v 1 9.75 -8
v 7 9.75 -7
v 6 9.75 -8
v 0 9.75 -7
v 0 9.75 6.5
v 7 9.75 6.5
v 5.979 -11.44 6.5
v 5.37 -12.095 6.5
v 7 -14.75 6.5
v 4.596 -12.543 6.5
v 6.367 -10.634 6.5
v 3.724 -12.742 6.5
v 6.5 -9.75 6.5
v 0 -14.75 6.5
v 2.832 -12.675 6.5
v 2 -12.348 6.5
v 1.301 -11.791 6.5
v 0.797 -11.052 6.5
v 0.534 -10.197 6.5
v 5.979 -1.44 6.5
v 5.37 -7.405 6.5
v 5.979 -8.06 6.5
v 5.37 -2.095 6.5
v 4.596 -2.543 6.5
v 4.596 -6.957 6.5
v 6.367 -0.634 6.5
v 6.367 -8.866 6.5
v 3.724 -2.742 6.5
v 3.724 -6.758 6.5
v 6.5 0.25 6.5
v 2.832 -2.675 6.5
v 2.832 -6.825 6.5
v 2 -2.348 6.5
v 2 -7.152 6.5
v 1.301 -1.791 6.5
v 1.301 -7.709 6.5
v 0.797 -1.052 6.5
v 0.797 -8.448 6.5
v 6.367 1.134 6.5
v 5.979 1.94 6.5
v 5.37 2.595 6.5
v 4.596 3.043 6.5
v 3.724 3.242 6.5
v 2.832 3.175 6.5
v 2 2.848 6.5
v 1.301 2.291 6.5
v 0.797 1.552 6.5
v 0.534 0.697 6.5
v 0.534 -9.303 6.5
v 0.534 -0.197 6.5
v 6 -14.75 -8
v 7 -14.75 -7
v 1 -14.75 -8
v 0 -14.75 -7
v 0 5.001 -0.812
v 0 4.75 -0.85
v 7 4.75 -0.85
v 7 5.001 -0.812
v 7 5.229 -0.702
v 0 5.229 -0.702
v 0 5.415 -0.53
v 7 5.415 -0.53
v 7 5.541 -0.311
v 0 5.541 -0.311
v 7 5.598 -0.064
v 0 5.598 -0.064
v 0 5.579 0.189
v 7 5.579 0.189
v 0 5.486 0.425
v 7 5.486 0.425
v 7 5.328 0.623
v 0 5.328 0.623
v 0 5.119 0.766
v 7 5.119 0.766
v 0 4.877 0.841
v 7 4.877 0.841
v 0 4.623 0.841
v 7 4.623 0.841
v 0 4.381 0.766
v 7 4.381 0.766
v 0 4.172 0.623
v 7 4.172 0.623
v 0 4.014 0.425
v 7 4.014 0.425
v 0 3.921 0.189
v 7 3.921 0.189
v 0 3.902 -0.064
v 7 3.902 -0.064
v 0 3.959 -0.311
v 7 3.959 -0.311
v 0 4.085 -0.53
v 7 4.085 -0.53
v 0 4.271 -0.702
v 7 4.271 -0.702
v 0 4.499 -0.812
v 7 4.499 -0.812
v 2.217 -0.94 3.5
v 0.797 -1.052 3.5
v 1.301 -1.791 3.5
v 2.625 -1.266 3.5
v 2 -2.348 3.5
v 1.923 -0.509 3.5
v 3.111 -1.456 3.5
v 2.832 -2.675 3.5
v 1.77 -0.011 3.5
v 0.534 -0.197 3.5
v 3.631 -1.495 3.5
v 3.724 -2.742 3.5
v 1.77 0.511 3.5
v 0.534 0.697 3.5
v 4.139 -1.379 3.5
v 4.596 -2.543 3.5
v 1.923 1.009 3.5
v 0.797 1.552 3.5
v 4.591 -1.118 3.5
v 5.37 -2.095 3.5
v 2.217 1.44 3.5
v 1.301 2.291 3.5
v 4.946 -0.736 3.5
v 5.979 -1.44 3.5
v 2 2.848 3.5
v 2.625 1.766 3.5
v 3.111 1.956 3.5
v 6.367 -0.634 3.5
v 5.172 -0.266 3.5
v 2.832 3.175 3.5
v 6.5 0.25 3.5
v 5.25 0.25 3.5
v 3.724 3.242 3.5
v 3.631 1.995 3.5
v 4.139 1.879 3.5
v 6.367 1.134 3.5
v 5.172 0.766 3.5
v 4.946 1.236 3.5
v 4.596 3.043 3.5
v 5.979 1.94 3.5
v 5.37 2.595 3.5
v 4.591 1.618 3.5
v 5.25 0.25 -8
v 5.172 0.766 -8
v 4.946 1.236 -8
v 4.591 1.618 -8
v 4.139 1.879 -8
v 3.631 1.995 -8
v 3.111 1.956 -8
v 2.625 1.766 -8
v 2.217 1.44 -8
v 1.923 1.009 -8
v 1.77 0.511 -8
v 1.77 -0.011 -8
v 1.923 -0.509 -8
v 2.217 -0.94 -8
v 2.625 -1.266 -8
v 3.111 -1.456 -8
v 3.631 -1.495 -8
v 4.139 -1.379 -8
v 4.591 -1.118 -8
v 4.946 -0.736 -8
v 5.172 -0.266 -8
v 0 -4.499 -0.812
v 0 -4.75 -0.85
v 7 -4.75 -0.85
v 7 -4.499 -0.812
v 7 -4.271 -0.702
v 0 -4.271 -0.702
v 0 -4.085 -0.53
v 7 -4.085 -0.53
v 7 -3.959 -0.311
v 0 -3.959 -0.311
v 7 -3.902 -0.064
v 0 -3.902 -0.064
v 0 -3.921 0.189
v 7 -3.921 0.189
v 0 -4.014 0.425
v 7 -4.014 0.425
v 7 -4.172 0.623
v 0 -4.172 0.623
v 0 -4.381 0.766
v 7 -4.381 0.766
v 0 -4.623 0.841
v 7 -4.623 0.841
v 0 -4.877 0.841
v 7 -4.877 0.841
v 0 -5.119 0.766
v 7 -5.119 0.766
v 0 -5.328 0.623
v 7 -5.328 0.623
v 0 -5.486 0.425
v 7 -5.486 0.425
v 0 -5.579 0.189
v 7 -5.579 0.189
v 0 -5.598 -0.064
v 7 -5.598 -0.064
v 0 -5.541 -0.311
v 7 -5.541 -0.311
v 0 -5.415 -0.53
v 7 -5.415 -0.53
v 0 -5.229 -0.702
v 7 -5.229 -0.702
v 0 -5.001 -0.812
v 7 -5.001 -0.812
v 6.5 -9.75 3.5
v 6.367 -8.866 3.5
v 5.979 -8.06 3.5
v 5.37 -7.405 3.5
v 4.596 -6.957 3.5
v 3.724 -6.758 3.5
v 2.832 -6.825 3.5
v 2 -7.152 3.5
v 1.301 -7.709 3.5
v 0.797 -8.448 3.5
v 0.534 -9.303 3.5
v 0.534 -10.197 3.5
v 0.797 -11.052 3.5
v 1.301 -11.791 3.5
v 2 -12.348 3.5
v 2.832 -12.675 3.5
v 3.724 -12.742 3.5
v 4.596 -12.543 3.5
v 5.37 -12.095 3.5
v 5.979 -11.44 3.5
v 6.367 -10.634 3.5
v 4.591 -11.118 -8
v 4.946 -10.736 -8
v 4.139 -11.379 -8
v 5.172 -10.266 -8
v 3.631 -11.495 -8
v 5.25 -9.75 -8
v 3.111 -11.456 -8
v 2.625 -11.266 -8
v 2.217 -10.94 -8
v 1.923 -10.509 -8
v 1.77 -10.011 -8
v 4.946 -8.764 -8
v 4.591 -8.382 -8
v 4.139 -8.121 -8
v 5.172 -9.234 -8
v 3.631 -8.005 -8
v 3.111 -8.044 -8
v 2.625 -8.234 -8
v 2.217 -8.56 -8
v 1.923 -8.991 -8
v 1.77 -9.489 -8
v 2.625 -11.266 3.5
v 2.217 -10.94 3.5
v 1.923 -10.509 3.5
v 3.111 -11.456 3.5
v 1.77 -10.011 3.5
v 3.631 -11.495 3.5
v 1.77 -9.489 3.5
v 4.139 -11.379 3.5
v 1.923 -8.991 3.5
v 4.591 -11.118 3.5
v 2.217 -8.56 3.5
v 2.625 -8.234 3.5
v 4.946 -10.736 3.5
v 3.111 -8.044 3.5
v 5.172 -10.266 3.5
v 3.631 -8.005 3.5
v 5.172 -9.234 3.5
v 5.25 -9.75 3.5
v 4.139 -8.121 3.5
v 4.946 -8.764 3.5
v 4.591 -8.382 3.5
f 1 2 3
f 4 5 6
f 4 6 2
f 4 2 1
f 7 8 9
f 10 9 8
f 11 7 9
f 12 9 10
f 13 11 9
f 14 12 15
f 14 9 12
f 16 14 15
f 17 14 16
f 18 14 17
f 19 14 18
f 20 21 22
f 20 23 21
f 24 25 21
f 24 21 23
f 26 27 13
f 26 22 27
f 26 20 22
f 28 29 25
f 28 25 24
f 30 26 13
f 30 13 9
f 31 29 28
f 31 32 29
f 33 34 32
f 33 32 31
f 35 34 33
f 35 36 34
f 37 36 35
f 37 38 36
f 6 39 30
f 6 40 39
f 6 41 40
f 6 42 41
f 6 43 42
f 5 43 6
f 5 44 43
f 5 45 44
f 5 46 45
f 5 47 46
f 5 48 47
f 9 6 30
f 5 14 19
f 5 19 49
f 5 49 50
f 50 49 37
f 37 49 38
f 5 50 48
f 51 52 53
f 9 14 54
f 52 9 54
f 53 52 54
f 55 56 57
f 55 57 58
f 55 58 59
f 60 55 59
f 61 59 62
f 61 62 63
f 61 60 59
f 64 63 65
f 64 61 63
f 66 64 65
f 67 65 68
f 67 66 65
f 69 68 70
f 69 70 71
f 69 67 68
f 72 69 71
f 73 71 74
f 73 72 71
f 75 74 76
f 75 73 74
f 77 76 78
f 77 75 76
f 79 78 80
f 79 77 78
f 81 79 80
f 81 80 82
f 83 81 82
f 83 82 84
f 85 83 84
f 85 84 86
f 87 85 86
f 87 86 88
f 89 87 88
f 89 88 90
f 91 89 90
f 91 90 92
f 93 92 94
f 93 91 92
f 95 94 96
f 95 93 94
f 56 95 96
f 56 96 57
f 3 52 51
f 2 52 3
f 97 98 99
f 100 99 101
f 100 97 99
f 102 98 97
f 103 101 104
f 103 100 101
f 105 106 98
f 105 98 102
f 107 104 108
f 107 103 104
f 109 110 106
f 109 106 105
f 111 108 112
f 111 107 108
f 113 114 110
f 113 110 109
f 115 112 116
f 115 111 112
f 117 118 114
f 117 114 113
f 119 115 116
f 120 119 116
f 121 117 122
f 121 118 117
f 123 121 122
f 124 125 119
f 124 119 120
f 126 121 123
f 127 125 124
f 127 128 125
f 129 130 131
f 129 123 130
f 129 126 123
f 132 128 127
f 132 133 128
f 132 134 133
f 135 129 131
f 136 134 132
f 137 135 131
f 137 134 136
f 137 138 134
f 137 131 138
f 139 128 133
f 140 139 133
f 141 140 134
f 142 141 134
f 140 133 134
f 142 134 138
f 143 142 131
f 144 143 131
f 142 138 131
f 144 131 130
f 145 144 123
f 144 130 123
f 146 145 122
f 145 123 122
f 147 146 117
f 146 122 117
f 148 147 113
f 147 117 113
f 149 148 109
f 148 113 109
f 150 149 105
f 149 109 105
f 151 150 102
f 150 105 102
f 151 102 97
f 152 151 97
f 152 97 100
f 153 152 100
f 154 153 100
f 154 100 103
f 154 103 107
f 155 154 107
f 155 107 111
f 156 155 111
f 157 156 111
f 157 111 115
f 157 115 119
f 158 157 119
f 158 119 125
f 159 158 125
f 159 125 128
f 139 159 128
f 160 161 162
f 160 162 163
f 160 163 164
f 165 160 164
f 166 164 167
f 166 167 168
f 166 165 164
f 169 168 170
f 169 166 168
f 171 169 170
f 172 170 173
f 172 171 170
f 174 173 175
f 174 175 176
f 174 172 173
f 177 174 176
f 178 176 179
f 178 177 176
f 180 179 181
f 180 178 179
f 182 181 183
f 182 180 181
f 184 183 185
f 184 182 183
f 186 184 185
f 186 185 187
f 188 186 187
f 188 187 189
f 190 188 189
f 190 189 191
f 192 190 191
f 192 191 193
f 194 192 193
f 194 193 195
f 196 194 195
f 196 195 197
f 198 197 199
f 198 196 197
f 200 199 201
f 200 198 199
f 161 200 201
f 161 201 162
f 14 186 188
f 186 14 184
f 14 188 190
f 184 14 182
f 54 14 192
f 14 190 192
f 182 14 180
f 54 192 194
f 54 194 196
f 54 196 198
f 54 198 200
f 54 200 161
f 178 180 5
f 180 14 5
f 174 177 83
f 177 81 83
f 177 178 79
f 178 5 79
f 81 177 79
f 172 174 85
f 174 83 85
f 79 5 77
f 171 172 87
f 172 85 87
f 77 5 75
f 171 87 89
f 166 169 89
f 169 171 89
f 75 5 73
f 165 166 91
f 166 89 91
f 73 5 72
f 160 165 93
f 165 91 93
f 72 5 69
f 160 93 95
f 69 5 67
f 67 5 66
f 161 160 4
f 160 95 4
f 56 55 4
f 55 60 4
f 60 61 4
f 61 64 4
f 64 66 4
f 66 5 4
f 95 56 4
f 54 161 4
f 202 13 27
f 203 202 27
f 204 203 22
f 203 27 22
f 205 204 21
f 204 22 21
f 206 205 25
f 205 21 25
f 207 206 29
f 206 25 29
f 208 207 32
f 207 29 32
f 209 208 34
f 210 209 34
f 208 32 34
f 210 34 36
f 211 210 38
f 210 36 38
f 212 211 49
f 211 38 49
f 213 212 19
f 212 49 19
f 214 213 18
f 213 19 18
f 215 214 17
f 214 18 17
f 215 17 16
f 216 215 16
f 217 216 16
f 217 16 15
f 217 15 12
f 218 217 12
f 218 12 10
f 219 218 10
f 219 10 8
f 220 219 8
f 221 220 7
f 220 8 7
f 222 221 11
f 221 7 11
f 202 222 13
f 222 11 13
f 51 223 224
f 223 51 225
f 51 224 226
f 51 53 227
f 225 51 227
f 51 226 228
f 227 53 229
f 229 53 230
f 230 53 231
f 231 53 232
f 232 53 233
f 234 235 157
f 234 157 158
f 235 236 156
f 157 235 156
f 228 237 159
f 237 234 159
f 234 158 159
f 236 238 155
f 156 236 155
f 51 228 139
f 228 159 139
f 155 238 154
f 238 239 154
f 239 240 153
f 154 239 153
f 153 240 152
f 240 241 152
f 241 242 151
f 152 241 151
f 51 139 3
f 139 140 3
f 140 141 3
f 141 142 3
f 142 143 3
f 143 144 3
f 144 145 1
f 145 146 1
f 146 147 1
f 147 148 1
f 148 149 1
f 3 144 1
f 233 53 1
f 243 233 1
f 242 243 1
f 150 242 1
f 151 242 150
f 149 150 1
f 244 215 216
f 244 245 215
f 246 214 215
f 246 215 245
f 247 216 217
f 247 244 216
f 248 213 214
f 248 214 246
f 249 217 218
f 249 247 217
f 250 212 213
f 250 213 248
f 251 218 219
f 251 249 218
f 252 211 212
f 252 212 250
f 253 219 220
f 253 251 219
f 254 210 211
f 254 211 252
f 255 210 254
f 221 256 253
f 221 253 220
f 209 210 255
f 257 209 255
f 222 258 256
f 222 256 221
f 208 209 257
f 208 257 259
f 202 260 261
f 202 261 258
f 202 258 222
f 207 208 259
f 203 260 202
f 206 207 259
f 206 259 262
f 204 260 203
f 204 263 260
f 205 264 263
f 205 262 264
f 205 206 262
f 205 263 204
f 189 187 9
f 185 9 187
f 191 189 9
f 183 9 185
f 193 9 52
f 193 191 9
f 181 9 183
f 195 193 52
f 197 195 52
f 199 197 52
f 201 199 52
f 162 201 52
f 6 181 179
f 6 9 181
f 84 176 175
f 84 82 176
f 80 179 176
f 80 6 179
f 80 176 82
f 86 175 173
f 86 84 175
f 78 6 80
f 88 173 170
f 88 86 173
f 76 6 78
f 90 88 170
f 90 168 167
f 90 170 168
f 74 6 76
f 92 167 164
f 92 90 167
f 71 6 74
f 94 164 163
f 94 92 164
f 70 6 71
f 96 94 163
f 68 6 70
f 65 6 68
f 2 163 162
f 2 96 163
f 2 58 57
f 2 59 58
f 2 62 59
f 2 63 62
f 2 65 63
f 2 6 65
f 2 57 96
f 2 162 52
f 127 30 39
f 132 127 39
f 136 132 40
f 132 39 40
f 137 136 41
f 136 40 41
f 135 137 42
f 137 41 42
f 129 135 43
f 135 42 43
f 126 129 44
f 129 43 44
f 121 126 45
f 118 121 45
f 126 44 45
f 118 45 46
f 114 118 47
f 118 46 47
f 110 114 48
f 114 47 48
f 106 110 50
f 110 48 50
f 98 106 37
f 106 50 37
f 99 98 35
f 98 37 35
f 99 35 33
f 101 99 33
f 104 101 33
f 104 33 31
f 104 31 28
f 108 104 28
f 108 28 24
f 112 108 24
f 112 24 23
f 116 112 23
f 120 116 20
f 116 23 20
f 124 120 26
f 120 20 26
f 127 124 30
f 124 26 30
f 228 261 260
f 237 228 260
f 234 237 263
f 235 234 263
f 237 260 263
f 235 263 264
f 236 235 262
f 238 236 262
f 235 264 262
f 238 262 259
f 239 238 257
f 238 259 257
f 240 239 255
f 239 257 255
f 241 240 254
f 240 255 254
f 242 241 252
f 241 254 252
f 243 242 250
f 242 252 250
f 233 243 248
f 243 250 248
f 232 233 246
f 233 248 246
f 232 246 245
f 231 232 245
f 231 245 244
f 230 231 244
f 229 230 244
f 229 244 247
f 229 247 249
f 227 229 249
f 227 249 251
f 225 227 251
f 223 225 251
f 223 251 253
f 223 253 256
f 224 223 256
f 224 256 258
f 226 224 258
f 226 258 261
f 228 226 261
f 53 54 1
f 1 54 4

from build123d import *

# Parameters (mm, degrees)
SKETCH1_W           = 14.5
SKETCH1_H           = 24.5
SKETCH1_R           = 0.85
BOSS_EXTRUDE1_DEPTH = 7
CHAMFER1_SIZE       = 1
SKETCH2_R           = 1.75
CUT_EXTRUDE1_DEPTH  = 22.836036728
SKETCH3_R           = 3
CUT_EXTRUDE2_DEPTH  = 3


with BuildPart() as part:
    # Sketch1 → Boss-Extrude1 (new body)
    with BuildSketch(Plane(origin=(0, 0, 0), x_dir=(0, 0, -1), z_dir=(1, 0, 0))):
        with Locations((0.75, -2.5)):
            Rectangle(SKETCH1_W, SKETCH1_H)
        with Locations((0, 4.75)):
            Circle(SKETCH1_R, mode=Mode.SUBTRACT)
        with Locations((0, -4.75)):
            Circle(SKETCH1_R, mode=Mode.SUBTRACT)
    extrude(amount=BOSS_EXTRUDE1_DEPTH)

    # Chamfer1
    chamfer1_edges = [part.edges().sort_by_distance(p)[0] for p in [
        (7, -2.5, -8),
        (0, -2.5, -8),
    ]]
    chamfer(chamfer1_edges, length=CHAMFER1_SIZE)

    # Sketch2 → Cut-Extrude1 (cut, through all)
    with BuildSketch(Plane.XY.offset(6.5)):
        with Locations((3.5, 0.25)):
            Circle(SKETCH2_R)
        with Locations((3.5, -9.75)):
            Circle(SKETCH2_R)
    extrude(amount=-CUT_EXTRUDE1_DEPTH, mode=Mode.SUBTRACT)

    # Sketch3 → Cut-Extrude2 (cut)
    with BuildSketch(Plane.XY.offset(6.5)):
        with Locations((3.5, 0.25)):
            Circle(SKETCH3_R)
        with Locations((3.5, -9.75)):
            Circle(SKETCH3_R)
    extrude(amount=-CUT_EXTRUDE2_DEPTH, mode=Mode.SUBTRACT)


solid = part.part
